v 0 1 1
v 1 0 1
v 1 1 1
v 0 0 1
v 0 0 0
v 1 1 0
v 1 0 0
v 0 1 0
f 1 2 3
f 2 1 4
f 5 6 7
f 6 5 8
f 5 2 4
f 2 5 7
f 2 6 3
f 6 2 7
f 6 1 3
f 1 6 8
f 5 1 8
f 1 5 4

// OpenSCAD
function mklookupfunc( interp_func ) =
	// TODO: Binary subdivision instead of linear scan?
	let( lookup_func = function( t, list, index=0 )
		assert(len(list) > 0, "Lookup requires at least one item, but empty list was given!")
		// At or beyond last position?   Give 'em the last value.
		index >= len(list)-1 ? list[len(list)-1][1] :
		// At or before current position?  Give 'em the current value.
		t <= list[index][0] ? list[index][1] :
		t < list[index+1][0] ?
			// Time to interpolate!
			assert( index >= 0 )
			assert( index+1 < len(list) )
			let( t0 = list[index+0][0], t1 = list[index+1][0] )
			let( v0 = list[index+0][1], v1 = list[index+1][1] )
			let( rat = (t-t0)/(t1-t0) )
			interp_func(v0, v1, rat) :
		// Try next span
		lookup_func(t, list, index+1)
	)
   lookup_func;

lerp_vec = function(left, right, rat)
	assert(len(left) == len(right), "left/right vectors must be same length to interpolate")
	[
		for( i=[0 : 1 : len(left)-1] )
		left[i] + (right[i] - left[i])*rat
	];

let( looked_up = mklookupfunc(lerp_vec)( 1, [
	[0, [0,0,0]],
	[2, [20,30,40]],
]))
assert( looked_up == [10, 15, 20] );

cube();
